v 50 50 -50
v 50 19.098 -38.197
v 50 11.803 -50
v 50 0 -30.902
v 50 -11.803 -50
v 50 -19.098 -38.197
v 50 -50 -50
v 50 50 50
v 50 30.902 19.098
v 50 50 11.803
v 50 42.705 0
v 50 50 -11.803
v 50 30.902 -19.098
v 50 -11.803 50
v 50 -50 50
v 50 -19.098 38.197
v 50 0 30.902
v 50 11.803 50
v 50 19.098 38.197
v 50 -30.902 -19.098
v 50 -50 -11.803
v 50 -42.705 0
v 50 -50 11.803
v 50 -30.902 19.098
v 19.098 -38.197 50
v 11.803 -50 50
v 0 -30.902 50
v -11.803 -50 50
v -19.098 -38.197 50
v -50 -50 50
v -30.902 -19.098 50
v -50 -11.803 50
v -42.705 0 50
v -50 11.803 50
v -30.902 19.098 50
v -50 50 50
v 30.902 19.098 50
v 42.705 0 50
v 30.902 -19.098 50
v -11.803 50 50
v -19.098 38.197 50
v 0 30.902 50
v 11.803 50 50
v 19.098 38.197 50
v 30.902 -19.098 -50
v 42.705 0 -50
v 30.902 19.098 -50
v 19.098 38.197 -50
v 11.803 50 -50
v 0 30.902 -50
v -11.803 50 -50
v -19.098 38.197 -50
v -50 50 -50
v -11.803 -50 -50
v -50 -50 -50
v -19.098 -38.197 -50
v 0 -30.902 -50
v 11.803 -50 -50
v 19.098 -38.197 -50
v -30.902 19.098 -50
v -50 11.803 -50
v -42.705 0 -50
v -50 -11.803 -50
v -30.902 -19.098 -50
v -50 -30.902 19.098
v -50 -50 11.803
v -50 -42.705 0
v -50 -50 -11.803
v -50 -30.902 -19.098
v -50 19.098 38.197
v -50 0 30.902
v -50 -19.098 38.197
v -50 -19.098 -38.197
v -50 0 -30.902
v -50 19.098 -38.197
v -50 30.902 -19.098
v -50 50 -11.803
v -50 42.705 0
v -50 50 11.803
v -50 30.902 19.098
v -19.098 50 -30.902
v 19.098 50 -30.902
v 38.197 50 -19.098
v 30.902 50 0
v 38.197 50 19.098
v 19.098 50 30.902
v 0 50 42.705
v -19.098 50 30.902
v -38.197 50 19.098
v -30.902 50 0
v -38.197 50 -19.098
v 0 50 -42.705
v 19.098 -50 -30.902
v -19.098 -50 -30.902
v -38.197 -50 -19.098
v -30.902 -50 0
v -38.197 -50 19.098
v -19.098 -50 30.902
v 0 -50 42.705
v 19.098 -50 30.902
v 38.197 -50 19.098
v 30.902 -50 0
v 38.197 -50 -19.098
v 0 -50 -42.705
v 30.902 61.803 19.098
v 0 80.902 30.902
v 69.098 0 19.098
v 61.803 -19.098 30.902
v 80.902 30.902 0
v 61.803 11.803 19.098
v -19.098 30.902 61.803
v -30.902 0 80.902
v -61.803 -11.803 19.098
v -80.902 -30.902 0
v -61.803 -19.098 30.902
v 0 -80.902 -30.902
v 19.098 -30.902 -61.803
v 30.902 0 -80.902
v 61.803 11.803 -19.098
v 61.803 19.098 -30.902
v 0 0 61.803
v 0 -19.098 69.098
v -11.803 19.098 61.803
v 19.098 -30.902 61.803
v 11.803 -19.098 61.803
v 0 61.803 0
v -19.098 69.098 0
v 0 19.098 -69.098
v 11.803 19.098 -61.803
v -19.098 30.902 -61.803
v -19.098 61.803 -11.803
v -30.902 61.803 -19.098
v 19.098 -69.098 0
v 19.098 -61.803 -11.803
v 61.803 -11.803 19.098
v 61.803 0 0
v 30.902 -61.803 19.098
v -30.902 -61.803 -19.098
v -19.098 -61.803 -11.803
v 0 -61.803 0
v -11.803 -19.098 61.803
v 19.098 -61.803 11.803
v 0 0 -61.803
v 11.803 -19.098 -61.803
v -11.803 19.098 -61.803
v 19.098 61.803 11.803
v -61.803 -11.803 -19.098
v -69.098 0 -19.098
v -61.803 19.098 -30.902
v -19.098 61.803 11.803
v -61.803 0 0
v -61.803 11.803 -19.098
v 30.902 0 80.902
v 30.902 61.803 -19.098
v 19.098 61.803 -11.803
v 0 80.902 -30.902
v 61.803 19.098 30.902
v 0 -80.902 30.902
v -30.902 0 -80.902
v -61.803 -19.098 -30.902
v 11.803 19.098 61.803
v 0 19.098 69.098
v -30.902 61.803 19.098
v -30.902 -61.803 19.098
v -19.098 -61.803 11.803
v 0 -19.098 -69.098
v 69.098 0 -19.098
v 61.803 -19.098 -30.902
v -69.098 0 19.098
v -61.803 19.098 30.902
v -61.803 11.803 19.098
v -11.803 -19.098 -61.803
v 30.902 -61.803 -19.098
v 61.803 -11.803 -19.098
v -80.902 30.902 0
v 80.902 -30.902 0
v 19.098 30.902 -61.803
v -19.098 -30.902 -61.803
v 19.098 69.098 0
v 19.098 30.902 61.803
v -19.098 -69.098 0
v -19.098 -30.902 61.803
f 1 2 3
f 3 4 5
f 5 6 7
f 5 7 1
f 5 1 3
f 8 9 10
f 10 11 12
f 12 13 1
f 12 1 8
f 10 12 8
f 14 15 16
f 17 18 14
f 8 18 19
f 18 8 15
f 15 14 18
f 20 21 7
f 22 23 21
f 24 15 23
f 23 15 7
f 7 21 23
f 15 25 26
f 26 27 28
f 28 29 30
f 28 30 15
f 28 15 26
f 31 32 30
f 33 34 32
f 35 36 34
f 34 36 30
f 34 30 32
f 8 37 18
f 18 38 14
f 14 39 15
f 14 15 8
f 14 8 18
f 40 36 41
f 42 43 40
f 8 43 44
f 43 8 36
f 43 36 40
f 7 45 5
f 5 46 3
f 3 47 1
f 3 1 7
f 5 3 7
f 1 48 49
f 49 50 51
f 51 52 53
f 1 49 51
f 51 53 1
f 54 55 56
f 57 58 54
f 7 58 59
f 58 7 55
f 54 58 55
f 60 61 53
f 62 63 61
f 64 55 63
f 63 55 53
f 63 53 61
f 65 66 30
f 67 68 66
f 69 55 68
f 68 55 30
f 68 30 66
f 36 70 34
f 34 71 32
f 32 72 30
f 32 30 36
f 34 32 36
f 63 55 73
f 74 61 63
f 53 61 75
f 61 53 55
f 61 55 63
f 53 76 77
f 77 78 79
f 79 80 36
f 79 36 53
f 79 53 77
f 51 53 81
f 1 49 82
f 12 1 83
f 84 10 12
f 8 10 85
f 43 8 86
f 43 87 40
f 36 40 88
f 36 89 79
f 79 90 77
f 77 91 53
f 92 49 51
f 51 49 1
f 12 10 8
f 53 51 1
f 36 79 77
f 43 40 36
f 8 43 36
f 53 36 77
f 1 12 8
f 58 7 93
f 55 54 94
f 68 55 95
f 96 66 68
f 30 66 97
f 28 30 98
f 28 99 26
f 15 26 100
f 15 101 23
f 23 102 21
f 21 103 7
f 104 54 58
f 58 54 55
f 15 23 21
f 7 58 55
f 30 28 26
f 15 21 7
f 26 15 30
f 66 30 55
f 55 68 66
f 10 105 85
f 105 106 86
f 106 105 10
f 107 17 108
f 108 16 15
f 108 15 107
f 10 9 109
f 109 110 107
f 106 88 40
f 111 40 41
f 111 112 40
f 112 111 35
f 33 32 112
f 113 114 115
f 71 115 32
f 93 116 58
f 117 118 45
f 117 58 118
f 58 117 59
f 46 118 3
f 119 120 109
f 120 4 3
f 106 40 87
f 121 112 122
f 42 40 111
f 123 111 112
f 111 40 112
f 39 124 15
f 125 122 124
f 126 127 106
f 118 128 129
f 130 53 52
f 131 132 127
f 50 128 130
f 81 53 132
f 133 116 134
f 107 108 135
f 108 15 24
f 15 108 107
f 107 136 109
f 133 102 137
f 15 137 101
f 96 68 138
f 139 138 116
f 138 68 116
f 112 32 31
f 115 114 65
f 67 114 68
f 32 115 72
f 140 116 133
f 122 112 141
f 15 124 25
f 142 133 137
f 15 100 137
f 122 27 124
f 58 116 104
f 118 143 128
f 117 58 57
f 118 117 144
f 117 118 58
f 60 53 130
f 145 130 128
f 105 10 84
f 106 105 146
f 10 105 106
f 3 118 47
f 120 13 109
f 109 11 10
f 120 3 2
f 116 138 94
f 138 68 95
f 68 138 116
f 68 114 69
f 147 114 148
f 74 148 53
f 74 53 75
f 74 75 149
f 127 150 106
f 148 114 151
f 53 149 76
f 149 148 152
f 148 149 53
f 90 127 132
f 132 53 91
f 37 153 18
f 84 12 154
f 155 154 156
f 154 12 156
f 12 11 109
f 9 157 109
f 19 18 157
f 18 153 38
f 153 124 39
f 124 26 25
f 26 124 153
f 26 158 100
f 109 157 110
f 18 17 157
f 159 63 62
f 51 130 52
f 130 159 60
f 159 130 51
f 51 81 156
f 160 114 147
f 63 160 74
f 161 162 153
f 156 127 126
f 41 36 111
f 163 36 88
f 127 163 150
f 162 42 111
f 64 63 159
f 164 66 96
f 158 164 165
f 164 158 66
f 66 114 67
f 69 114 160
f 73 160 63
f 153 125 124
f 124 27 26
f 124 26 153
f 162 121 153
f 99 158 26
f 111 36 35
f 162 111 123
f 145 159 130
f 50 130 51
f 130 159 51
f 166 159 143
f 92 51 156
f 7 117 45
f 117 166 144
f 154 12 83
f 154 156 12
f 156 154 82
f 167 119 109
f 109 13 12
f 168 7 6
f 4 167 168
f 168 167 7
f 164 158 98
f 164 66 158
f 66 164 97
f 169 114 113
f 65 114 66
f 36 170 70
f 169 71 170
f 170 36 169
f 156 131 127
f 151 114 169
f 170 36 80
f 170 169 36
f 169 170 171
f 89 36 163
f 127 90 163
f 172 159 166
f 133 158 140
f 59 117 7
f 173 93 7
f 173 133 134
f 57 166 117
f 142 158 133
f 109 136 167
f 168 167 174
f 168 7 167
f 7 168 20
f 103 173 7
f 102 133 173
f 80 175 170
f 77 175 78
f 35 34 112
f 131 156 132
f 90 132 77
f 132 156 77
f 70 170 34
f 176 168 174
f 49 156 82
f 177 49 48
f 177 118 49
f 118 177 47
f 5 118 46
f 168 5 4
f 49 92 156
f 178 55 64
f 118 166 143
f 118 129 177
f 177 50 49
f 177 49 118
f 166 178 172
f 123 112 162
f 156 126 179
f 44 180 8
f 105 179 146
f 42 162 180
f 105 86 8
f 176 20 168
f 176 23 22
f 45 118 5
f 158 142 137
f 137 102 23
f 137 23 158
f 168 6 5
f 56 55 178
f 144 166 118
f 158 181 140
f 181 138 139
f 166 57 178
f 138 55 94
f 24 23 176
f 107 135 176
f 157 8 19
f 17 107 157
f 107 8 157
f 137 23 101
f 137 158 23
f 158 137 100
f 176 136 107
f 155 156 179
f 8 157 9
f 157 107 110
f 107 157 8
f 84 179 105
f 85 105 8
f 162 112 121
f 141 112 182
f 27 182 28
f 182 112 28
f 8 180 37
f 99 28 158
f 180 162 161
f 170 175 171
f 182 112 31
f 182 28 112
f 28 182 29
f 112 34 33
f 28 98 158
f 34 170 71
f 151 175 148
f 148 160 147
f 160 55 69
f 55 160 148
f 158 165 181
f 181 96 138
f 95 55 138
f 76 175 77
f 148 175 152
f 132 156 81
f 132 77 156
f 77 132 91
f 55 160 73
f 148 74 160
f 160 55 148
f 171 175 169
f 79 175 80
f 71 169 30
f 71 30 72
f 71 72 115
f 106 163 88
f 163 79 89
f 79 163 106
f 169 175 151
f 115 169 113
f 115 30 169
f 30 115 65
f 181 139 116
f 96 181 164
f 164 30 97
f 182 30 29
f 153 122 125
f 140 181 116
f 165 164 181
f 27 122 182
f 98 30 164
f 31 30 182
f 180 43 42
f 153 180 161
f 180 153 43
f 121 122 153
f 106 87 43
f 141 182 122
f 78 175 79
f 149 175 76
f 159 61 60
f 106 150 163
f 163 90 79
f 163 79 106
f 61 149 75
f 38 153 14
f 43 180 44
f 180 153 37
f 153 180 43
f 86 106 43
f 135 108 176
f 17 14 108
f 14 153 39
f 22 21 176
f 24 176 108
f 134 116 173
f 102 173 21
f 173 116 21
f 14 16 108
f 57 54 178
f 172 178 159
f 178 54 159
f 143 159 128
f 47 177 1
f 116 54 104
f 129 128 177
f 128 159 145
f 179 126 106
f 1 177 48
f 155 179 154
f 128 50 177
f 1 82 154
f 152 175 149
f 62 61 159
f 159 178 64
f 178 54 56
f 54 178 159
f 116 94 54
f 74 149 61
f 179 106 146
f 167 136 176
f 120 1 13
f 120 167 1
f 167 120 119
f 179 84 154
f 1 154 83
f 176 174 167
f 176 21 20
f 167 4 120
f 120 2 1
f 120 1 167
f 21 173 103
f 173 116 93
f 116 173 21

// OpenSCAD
// Composto de cinco cubos

/*
  O solido gerado serah a uniao de 5 cubos, formando uma figura cuja envoltoria
  convexa eh um dodecaedro.

  Cada cubo eh gerado pela rotacao de um cubo basico, com um angulo multiplo de
  72 graus, em torno de um eixo definido por um certo vetor (o vetor aponta para
  uma das 12 faces do dodecaedro formado pela figura). Cada uma das 12 x 5 = 60
  arestas dos 5 cubos eh uma diagonal de uma face do dodecaedro. Para cada face,
  as diagonais formam uma estrela de 5 pontas.
*/

// Definindo o angulo fundamental de rotacao
angulo = 72;

// Definindo um tamanho para o cubo basico
tamanho_cubo = 100;

// Definindo a lista de cores dos 5 cubos
cores = ["yellow", "red", "blue", "green", "magenta"];

// Definindo o numero aureo
aureo = (1 + sqrt(5))/2;

// Definindo o vetor que serah o eixo de rotacao para o cubo basico
eixo_de_rotacao = [0, (2 + aureo)/5, (1 + 3*aureo)/5];

module cubo_rotacionado(i) {
    color(cores[i]) {
      rotate(angulo * i, eixo_de_rotacao * i) {
        cube(tamanho_cubo, center=true);
      }
    }
}


module cubos() {
    for (i = [0:4]) {
        cubo_rotacionado(i);
    }
}

cubos();
